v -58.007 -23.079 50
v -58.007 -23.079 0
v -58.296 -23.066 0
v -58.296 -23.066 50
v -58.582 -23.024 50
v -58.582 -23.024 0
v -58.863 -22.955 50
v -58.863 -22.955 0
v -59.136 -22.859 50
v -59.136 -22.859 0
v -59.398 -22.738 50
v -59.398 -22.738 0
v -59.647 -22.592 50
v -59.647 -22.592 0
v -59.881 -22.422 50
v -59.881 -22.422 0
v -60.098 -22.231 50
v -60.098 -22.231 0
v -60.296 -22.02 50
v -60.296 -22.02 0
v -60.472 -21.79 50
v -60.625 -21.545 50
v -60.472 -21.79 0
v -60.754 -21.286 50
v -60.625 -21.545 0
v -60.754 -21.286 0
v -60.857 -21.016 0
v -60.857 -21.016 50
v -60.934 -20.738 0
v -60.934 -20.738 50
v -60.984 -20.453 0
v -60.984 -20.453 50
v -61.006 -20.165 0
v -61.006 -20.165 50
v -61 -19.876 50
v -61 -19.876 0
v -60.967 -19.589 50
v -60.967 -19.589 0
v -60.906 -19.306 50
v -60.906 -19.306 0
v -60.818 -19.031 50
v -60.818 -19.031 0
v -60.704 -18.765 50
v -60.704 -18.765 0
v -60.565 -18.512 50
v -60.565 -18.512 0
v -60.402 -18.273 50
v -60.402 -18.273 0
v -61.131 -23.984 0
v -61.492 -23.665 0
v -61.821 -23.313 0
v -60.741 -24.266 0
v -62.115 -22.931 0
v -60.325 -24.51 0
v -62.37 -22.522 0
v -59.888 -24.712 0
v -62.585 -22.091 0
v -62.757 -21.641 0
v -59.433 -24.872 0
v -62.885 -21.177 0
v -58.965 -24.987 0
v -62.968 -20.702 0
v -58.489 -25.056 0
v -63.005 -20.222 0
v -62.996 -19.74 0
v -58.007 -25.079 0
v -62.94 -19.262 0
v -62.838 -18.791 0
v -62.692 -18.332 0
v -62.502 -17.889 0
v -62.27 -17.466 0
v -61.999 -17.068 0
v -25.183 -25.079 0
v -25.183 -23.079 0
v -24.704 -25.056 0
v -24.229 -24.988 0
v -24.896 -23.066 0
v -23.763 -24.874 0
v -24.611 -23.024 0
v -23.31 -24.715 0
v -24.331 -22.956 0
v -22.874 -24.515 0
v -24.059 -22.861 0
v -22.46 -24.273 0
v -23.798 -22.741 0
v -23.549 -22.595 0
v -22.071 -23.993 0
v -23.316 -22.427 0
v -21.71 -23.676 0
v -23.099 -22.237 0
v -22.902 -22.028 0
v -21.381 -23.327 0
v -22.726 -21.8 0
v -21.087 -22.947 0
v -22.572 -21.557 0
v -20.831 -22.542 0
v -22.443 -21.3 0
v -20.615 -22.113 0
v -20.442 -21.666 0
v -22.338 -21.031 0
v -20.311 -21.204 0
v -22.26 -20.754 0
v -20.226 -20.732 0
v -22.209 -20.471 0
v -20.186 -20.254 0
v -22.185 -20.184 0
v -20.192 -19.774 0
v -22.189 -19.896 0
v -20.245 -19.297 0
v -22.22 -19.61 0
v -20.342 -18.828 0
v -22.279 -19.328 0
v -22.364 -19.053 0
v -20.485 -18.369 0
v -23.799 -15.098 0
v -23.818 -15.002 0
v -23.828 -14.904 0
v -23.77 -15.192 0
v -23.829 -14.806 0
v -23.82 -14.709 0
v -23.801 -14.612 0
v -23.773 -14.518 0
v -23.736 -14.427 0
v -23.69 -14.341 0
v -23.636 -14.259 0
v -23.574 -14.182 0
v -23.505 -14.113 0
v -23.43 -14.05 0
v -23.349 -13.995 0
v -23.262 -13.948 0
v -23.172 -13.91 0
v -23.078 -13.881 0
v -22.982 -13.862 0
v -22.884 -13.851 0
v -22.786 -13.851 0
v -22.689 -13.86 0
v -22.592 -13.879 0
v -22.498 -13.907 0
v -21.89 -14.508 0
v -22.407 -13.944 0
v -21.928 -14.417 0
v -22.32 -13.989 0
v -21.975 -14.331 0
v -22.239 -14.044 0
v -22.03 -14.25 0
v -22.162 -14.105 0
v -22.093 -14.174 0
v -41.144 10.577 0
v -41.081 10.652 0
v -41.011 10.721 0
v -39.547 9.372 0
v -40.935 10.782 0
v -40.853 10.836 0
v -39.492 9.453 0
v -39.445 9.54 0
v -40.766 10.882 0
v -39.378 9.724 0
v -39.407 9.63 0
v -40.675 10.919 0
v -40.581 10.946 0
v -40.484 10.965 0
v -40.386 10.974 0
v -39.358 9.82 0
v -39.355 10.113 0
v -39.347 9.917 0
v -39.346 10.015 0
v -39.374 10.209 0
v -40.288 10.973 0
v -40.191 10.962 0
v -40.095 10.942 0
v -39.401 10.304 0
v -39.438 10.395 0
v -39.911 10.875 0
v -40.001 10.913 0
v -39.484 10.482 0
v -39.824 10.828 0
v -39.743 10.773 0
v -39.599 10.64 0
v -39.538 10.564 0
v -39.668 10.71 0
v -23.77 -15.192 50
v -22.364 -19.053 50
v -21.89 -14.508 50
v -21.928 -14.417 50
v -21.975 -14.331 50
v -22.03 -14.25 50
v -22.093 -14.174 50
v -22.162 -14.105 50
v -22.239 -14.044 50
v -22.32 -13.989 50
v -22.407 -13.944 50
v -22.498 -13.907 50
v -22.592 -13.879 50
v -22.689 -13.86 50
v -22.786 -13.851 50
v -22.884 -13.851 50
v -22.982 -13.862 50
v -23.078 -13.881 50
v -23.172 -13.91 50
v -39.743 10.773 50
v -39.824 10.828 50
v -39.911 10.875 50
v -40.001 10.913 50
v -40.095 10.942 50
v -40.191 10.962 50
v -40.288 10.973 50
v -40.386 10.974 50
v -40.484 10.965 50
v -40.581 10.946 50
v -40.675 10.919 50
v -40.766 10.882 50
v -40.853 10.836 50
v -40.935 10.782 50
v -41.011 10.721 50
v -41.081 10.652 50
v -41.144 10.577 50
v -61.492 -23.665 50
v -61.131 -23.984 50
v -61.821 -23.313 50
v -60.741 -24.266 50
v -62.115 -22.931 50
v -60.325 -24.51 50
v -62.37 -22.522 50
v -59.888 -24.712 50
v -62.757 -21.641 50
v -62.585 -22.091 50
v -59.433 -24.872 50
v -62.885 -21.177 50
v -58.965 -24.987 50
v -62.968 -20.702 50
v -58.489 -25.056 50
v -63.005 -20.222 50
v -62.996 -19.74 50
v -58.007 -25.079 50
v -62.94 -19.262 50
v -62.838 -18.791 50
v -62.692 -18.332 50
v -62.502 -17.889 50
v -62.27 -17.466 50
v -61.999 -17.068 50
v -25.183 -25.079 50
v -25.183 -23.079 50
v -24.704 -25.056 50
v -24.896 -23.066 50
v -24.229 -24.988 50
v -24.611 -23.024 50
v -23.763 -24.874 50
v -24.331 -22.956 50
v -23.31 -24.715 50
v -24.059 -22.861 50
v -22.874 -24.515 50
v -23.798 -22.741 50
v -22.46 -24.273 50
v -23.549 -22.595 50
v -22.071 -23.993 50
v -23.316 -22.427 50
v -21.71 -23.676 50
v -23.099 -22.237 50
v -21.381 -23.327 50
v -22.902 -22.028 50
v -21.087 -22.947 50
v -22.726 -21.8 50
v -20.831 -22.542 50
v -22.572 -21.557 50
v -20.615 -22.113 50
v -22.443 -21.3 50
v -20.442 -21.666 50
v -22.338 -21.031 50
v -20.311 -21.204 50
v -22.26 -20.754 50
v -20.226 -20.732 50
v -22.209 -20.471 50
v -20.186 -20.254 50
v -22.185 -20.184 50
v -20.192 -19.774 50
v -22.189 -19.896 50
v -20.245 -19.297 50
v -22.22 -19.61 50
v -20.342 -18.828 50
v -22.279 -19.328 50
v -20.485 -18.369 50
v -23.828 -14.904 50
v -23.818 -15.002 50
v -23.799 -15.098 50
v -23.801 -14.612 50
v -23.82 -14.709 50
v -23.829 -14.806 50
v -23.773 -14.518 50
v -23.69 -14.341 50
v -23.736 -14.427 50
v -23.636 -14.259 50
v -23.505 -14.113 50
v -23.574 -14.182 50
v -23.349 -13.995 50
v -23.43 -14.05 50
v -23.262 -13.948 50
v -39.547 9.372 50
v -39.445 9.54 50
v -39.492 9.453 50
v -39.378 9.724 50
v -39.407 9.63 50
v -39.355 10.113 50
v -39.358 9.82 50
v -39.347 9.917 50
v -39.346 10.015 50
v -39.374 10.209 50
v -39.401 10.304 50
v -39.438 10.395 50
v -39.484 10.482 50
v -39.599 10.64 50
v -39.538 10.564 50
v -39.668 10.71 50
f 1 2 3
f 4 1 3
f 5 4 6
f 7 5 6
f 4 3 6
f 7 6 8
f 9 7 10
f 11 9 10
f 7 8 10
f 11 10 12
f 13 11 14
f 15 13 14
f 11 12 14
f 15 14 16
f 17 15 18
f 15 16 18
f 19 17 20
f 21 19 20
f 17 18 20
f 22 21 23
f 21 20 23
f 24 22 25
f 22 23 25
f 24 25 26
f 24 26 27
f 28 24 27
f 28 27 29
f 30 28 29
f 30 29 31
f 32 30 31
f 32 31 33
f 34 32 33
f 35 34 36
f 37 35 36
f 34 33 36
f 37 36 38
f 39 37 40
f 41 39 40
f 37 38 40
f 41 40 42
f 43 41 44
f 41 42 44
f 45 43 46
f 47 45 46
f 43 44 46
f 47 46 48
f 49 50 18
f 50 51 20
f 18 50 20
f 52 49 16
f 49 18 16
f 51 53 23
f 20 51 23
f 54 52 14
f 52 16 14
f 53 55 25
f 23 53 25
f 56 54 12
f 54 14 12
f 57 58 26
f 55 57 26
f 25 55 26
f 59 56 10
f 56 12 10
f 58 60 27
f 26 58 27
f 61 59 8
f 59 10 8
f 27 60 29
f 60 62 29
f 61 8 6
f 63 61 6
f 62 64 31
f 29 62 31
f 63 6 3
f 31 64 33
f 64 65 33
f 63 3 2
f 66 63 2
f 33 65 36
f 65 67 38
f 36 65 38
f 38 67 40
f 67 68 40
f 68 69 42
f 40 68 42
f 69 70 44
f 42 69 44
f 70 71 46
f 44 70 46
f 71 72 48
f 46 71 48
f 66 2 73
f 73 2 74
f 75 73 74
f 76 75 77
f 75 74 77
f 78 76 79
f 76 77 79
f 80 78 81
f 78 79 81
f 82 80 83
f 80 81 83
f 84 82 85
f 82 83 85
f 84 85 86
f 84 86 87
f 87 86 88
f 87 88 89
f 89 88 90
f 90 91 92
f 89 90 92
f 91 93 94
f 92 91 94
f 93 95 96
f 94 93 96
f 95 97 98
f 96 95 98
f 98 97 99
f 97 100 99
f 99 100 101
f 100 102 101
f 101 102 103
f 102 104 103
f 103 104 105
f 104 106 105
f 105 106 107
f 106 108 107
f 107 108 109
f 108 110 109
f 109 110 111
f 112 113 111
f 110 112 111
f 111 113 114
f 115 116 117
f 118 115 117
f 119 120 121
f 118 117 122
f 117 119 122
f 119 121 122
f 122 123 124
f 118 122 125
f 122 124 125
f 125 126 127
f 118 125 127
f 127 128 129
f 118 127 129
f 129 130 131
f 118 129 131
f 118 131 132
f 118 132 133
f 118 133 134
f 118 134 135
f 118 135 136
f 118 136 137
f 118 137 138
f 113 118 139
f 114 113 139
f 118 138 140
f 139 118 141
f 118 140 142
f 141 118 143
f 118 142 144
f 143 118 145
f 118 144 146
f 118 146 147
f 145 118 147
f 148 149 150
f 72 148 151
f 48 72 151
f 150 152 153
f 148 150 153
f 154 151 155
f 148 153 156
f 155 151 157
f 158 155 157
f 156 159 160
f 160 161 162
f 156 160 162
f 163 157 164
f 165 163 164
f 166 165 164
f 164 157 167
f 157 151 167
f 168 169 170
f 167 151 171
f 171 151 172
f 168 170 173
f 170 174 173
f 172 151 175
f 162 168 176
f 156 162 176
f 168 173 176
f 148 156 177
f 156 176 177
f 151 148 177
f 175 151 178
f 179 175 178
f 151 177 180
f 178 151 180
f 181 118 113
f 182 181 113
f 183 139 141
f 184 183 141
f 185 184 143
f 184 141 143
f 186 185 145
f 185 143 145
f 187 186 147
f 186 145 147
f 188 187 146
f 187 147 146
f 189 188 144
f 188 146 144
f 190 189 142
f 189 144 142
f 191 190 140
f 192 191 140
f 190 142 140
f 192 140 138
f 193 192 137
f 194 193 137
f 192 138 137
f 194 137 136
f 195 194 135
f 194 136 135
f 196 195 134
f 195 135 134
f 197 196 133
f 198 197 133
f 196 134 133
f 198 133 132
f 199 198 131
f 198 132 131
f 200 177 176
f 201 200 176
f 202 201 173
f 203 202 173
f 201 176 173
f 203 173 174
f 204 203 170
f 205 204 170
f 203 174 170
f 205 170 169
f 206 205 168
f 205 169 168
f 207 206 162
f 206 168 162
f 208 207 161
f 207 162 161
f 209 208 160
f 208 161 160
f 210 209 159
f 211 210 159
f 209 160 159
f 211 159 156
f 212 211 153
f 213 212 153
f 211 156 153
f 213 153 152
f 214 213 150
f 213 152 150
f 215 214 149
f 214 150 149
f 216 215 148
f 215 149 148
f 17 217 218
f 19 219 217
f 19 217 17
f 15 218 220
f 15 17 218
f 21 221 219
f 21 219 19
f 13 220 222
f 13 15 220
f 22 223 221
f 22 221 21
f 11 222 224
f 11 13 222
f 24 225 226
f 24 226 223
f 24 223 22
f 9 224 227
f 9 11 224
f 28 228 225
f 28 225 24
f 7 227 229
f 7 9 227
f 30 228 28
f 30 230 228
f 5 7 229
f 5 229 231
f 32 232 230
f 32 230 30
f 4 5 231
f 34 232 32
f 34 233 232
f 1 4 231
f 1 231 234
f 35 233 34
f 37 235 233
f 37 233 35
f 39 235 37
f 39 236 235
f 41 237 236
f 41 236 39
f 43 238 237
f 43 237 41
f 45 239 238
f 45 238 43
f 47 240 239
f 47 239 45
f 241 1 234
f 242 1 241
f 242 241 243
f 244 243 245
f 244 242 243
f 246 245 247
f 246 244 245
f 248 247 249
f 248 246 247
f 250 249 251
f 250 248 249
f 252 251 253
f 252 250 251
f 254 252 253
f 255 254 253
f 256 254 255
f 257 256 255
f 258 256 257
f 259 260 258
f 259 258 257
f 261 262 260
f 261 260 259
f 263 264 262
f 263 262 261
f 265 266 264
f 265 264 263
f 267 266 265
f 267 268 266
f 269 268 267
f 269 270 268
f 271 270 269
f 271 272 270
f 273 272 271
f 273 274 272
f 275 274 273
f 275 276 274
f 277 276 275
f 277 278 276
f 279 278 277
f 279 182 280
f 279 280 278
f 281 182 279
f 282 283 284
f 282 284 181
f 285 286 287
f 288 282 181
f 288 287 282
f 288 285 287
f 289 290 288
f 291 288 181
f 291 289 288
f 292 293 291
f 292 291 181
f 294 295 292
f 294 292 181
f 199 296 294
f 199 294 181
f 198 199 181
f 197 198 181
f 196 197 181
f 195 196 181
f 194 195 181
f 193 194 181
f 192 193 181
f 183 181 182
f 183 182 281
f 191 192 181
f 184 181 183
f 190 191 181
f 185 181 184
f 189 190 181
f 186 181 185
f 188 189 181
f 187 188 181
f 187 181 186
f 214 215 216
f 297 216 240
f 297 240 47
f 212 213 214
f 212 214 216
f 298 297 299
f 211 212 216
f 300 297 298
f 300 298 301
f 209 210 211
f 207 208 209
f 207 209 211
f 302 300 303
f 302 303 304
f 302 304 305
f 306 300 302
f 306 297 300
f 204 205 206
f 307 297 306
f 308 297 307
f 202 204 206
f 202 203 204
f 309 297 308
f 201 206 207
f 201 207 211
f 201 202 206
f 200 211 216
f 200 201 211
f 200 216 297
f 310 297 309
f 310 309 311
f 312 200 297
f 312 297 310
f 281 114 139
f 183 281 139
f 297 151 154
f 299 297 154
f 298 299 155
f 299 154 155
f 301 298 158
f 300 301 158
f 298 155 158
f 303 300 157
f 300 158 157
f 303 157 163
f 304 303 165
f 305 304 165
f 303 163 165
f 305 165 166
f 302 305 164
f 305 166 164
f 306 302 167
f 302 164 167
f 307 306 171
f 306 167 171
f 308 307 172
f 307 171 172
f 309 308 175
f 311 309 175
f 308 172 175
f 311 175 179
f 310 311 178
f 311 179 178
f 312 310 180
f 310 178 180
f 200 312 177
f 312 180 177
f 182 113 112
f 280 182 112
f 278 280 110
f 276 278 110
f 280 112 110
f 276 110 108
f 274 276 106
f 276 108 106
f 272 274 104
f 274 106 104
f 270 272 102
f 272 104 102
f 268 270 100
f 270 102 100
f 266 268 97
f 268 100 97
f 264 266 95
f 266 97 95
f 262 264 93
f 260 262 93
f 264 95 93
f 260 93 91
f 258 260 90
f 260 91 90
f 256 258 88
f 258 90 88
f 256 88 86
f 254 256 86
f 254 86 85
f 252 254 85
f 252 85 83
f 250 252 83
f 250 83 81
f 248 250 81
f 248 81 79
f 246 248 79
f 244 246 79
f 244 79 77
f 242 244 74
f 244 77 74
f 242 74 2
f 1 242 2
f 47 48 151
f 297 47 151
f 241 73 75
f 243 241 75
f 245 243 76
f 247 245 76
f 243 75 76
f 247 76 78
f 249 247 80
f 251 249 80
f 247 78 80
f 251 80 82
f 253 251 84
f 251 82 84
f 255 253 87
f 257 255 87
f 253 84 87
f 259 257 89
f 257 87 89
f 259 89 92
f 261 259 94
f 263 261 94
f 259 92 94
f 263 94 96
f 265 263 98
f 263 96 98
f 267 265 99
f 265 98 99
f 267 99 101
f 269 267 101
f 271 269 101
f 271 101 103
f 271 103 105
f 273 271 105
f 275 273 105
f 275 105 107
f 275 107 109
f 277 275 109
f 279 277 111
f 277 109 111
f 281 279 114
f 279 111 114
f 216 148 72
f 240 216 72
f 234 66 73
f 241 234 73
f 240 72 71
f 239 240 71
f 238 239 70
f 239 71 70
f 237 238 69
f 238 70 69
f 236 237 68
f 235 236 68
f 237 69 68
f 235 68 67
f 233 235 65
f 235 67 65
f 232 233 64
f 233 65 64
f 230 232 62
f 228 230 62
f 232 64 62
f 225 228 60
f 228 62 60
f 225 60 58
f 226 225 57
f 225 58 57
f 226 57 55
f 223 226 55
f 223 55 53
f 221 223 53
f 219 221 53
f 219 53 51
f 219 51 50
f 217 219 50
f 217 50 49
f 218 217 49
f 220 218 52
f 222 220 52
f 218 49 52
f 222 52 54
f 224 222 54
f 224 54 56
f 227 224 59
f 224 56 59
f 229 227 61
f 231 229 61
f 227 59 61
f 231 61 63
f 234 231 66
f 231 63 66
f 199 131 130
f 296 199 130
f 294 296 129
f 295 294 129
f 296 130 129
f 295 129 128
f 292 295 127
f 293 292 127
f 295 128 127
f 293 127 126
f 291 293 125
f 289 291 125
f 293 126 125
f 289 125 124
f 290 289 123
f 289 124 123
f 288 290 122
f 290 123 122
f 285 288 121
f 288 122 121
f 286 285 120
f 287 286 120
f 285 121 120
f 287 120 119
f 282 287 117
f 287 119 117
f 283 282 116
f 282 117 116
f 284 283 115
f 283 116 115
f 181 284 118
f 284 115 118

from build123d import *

# Parameters (mm, degrees)
F1_DEPTH = 50


with BuildPart() as f1:
    # F0 (on Top) → F1 (new body)
    with BuildSketch(Plane.XY):
        with BuildLine():
            Line((-20.484694, -18.369378), (-21.890144, -14.507935))
            ThreePointArc((-21.890144, -14.507935), (-22.407219, -13.943648), (-23.171857, -13.910263))
            ThreePointArc((-23.171857, -13.910263), (-23.736145, -14.427337), (-23.76953, -15.191975))
            Line((-23.76953, -15.191975), (-22.364079, -19.053418))
            ThreePointArc((-22.364079, -19.053418), (-22.725701, -21.800208), (-25.183157, -23.079479))
            Line((-25.183157, -23.079479), (-58.007304, -23.079479))
            ThreePointArc((-58.007304, -23.079479), (-60.692462, -21.41736), (-60.402253, -18.272763))
            Line((-60.402253, -18.272763), (-39.547274, 9.372207))
            ThreePointArc((-39.547274, 9.372207), (-39.355248, 10.113094), (-39.743351, 10.772762))
            ThreePointArc((-39.743351, 10.772762), (-40.484238, 10.964788), (-41.143906, 10.576685))
            Line((-41.143906, 10.576685), (-61.998885, -17.068286))
            ThreePointArc((-61.998885, -17.068286), (-62.482568, -22.309281), (-58.007304, -25.079479))
            Line((-58.007304, -25.079479), (-25.183157, -25.079479))
            ThreePointArc((-25.183157, -25.079479), (-21.087397, -22.947361), (-20.484694, -18.369378))
        make_face()
    extrude(amount=F1_DEPTH)


solid = f1.part
